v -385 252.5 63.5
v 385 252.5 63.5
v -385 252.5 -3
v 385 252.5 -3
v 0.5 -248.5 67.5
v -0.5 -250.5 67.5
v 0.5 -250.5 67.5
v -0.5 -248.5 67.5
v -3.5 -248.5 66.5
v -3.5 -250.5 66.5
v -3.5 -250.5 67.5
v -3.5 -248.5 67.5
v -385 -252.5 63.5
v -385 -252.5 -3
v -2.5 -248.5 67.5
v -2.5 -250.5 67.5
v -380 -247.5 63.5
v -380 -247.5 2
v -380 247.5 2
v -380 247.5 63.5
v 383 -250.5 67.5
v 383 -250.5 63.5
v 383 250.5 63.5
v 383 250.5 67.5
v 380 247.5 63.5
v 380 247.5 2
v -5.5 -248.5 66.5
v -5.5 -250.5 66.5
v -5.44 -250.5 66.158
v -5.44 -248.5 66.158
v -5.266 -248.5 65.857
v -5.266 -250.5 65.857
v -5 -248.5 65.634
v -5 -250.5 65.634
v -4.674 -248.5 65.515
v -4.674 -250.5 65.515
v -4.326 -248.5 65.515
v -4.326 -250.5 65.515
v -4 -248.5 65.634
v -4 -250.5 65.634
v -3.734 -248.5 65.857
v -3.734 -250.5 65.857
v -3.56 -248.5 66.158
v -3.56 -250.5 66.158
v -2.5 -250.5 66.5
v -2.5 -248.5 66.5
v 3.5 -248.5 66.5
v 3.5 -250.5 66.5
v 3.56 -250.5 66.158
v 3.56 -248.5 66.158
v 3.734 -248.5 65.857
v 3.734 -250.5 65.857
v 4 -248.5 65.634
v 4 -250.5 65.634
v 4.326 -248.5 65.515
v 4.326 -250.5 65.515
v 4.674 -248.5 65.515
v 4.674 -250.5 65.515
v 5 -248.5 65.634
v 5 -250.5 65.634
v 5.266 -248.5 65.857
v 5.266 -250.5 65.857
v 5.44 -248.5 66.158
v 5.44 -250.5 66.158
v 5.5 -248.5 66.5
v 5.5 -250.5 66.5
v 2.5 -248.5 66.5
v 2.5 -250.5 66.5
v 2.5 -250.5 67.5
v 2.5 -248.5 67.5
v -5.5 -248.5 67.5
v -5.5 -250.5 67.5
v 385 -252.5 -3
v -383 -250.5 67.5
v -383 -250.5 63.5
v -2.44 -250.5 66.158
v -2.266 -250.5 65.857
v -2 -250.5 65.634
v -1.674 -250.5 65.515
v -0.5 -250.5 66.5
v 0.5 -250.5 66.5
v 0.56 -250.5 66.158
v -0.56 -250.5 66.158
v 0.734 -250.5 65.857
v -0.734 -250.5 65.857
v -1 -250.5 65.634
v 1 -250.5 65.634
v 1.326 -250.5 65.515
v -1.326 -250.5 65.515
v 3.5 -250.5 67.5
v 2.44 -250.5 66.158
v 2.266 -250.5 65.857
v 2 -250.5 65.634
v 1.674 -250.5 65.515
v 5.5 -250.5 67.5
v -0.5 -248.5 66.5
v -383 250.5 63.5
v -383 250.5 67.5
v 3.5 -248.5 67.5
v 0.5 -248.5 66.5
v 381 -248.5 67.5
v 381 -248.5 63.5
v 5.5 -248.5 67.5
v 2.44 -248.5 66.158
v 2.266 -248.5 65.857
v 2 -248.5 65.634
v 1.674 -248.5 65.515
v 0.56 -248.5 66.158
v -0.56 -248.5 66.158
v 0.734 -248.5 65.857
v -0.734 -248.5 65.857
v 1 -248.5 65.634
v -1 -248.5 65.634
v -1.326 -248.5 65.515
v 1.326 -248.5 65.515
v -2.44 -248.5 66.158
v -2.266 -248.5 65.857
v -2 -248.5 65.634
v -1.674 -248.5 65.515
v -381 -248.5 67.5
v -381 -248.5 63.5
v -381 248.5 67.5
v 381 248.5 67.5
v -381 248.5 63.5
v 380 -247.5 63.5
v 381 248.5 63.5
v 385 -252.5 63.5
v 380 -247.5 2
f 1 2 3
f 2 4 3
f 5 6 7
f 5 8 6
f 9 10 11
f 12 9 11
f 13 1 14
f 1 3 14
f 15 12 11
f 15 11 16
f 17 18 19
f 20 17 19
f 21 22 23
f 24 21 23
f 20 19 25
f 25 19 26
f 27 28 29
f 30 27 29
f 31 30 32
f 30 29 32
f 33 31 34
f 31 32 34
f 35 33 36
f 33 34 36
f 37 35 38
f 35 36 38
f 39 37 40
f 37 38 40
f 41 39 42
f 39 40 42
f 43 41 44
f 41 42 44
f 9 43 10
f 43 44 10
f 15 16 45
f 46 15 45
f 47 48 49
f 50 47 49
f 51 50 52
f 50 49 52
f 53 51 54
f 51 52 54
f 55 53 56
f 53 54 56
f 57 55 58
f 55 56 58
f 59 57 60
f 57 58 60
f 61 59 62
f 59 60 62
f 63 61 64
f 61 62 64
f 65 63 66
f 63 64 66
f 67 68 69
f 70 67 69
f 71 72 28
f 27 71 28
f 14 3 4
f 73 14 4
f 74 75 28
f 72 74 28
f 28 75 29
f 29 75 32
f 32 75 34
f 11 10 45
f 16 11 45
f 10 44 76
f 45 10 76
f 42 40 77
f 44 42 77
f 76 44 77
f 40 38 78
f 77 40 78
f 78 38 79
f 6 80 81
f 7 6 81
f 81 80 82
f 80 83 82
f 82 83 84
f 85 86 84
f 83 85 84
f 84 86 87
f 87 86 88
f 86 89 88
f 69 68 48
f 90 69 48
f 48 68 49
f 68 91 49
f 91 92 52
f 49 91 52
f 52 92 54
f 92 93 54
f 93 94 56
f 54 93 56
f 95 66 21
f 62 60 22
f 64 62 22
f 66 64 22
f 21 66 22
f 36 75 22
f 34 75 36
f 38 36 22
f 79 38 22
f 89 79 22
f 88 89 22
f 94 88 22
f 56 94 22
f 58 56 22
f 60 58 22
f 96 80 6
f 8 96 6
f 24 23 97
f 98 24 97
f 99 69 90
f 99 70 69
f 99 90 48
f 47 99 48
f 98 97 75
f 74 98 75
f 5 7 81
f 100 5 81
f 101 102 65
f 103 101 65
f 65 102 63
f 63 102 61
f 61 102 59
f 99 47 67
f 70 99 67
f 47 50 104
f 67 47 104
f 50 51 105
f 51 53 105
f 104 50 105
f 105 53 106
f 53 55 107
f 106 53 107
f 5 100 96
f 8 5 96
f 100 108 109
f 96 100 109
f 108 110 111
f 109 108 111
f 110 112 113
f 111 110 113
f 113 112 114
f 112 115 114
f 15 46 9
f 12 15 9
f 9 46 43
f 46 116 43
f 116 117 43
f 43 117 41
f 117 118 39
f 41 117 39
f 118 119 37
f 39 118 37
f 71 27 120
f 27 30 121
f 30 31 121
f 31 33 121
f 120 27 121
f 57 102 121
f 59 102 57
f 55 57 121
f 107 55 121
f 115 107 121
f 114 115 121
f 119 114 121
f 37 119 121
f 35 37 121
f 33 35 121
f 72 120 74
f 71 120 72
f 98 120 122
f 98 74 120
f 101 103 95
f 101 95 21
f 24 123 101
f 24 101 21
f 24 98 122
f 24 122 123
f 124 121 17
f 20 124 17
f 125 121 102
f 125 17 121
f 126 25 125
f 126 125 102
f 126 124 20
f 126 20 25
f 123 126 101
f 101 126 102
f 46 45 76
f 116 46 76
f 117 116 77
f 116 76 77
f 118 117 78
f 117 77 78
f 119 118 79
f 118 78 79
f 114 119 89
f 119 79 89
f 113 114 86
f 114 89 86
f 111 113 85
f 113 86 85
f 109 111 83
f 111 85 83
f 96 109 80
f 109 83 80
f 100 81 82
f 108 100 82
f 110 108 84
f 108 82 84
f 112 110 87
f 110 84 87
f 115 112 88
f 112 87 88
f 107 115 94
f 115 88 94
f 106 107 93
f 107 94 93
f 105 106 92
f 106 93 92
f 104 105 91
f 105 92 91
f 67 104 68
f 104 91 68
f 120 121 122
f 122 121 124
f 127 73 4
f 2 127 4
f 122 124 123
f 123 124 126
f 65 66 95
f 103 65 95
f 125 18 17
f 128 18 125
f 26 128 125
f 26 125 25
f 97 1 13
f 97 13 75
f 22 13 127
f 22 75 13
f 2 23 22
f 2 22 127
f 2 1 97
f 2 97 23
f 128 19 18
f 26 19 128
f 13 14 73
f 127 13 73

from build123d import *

# Parameters (mm, degrees)
F0_W          = 770
F0_H          = 505
F1_DEPTH      = 2
F1_DEPTH_BACK = 3
F2_W          = 760
F2_H          = 495
F3_DEPTH      = 61.5
F5_DEPTH      = 4
F7_DEPTH      = 25.4


with BuildPart() as f1:
    # F0 (on Top) → F1 (new body, two sides)
    with BuildSketch(Plane.XY) as f1_sk:
        Rectangle(F0_W, F0_H)
    extrude(amount=F1_DEPTH)
    extrude(f1_sk.sketch, amount=-F1_DEPTH_BACK)

    # F2 (on face) → F3 (join)
    with BuildSketch(Plane.XY.offset(2)):
        Polygon((-380, -252.5), (385, -252.5), (385, 247.5), (385, 252.5), (380, 252.5), (-385, 252.5), (-385, -247.5), (-385, -252.5), align=None)
        Rectangle(F2_W, F2_H, mode=Mode.SUBTRACT)
    extrude(amount=F3_DEPTH)

    # F4 (on face) → F5 (join)
    with BuildSketch(Plane.XY.offset(63.5)):
        Polygon((383, 250.5), (381, 250.5), (-383, 250.5), (-383, -248.5), (-383, -250.5), (-276, -250.5), (383, -250.5), (383, 248.5), align=None)
        Polygon((-381, -248.5), (-381, -247.5), (-381, 248.5), (380, 248.5), (381, 248.5), (381, 247.5), (381, -248.5), (-380, -248.5), align=None, mode=Mode.SUBTRACT)
    extrude(amount=F5_DEPTH)

    # F6 (on face) → F7 (cut)
    with BuildSketch(Plane.XZ.offset(250.5)):
        with BuildLine():
            Line((4.5, 67.5), (3.5, 67.5))
            Line((3.5, 67.5), (3.5, 66.5))
            ThreePointArc((3.5, 66.5), (4.5, 65.5), (5.5, 66.5))
            Line((5.5, 66.5), (5.5, 67.5))
            Line((5.5, 67.5), (4.5, 67.5))
        make_face()
        with BuildLine():
            Line((1.5, 67.5), (0.5, 67.5))
            Line((0.5, 67.5), (0.5, 66.5))
            ThreePointArc((0.5, 66.5), (1.5, 65.5), (2.5, 66.5))
            Line((2.5, 66.5), (2.5, 67.5))
            Line((2.5, 67.5), (1.5, 67.5))
        make_face()
        with BuildLine():
            Line((-3.5, 66.5), (-3.5, 67.5))
            Line((-3.5, 67.5), (-4.5, 67.5))
            Line((-4.5, 67.5), (-5.5, 67.5))
            Line((-5.5, 67.5), (-5.5, 66.5))
            ThreePointArc((-5.5, 66.5), (-4.5, 65.5), (-3.5, 66.5))
        make_face()
        with BuildLine():
            Line((-0.5, 66.5), (-0.5, 67.5))
            Line((-0.5, 67.5), (-1.5, 67.5))
            Line((-1.5, 67.5), (-2.5, 67.5))
            Line((-2.5, 67.5), (-2.5, 66.5))
            ThreePointArc((-2.5, 66.5), (-1.5, 65.5), (-0.5, 66.5))
        make_face()
    extrude(amount=-F7_DEPTH, mode=Mode.SUBTRACT)


solid = f1.part
